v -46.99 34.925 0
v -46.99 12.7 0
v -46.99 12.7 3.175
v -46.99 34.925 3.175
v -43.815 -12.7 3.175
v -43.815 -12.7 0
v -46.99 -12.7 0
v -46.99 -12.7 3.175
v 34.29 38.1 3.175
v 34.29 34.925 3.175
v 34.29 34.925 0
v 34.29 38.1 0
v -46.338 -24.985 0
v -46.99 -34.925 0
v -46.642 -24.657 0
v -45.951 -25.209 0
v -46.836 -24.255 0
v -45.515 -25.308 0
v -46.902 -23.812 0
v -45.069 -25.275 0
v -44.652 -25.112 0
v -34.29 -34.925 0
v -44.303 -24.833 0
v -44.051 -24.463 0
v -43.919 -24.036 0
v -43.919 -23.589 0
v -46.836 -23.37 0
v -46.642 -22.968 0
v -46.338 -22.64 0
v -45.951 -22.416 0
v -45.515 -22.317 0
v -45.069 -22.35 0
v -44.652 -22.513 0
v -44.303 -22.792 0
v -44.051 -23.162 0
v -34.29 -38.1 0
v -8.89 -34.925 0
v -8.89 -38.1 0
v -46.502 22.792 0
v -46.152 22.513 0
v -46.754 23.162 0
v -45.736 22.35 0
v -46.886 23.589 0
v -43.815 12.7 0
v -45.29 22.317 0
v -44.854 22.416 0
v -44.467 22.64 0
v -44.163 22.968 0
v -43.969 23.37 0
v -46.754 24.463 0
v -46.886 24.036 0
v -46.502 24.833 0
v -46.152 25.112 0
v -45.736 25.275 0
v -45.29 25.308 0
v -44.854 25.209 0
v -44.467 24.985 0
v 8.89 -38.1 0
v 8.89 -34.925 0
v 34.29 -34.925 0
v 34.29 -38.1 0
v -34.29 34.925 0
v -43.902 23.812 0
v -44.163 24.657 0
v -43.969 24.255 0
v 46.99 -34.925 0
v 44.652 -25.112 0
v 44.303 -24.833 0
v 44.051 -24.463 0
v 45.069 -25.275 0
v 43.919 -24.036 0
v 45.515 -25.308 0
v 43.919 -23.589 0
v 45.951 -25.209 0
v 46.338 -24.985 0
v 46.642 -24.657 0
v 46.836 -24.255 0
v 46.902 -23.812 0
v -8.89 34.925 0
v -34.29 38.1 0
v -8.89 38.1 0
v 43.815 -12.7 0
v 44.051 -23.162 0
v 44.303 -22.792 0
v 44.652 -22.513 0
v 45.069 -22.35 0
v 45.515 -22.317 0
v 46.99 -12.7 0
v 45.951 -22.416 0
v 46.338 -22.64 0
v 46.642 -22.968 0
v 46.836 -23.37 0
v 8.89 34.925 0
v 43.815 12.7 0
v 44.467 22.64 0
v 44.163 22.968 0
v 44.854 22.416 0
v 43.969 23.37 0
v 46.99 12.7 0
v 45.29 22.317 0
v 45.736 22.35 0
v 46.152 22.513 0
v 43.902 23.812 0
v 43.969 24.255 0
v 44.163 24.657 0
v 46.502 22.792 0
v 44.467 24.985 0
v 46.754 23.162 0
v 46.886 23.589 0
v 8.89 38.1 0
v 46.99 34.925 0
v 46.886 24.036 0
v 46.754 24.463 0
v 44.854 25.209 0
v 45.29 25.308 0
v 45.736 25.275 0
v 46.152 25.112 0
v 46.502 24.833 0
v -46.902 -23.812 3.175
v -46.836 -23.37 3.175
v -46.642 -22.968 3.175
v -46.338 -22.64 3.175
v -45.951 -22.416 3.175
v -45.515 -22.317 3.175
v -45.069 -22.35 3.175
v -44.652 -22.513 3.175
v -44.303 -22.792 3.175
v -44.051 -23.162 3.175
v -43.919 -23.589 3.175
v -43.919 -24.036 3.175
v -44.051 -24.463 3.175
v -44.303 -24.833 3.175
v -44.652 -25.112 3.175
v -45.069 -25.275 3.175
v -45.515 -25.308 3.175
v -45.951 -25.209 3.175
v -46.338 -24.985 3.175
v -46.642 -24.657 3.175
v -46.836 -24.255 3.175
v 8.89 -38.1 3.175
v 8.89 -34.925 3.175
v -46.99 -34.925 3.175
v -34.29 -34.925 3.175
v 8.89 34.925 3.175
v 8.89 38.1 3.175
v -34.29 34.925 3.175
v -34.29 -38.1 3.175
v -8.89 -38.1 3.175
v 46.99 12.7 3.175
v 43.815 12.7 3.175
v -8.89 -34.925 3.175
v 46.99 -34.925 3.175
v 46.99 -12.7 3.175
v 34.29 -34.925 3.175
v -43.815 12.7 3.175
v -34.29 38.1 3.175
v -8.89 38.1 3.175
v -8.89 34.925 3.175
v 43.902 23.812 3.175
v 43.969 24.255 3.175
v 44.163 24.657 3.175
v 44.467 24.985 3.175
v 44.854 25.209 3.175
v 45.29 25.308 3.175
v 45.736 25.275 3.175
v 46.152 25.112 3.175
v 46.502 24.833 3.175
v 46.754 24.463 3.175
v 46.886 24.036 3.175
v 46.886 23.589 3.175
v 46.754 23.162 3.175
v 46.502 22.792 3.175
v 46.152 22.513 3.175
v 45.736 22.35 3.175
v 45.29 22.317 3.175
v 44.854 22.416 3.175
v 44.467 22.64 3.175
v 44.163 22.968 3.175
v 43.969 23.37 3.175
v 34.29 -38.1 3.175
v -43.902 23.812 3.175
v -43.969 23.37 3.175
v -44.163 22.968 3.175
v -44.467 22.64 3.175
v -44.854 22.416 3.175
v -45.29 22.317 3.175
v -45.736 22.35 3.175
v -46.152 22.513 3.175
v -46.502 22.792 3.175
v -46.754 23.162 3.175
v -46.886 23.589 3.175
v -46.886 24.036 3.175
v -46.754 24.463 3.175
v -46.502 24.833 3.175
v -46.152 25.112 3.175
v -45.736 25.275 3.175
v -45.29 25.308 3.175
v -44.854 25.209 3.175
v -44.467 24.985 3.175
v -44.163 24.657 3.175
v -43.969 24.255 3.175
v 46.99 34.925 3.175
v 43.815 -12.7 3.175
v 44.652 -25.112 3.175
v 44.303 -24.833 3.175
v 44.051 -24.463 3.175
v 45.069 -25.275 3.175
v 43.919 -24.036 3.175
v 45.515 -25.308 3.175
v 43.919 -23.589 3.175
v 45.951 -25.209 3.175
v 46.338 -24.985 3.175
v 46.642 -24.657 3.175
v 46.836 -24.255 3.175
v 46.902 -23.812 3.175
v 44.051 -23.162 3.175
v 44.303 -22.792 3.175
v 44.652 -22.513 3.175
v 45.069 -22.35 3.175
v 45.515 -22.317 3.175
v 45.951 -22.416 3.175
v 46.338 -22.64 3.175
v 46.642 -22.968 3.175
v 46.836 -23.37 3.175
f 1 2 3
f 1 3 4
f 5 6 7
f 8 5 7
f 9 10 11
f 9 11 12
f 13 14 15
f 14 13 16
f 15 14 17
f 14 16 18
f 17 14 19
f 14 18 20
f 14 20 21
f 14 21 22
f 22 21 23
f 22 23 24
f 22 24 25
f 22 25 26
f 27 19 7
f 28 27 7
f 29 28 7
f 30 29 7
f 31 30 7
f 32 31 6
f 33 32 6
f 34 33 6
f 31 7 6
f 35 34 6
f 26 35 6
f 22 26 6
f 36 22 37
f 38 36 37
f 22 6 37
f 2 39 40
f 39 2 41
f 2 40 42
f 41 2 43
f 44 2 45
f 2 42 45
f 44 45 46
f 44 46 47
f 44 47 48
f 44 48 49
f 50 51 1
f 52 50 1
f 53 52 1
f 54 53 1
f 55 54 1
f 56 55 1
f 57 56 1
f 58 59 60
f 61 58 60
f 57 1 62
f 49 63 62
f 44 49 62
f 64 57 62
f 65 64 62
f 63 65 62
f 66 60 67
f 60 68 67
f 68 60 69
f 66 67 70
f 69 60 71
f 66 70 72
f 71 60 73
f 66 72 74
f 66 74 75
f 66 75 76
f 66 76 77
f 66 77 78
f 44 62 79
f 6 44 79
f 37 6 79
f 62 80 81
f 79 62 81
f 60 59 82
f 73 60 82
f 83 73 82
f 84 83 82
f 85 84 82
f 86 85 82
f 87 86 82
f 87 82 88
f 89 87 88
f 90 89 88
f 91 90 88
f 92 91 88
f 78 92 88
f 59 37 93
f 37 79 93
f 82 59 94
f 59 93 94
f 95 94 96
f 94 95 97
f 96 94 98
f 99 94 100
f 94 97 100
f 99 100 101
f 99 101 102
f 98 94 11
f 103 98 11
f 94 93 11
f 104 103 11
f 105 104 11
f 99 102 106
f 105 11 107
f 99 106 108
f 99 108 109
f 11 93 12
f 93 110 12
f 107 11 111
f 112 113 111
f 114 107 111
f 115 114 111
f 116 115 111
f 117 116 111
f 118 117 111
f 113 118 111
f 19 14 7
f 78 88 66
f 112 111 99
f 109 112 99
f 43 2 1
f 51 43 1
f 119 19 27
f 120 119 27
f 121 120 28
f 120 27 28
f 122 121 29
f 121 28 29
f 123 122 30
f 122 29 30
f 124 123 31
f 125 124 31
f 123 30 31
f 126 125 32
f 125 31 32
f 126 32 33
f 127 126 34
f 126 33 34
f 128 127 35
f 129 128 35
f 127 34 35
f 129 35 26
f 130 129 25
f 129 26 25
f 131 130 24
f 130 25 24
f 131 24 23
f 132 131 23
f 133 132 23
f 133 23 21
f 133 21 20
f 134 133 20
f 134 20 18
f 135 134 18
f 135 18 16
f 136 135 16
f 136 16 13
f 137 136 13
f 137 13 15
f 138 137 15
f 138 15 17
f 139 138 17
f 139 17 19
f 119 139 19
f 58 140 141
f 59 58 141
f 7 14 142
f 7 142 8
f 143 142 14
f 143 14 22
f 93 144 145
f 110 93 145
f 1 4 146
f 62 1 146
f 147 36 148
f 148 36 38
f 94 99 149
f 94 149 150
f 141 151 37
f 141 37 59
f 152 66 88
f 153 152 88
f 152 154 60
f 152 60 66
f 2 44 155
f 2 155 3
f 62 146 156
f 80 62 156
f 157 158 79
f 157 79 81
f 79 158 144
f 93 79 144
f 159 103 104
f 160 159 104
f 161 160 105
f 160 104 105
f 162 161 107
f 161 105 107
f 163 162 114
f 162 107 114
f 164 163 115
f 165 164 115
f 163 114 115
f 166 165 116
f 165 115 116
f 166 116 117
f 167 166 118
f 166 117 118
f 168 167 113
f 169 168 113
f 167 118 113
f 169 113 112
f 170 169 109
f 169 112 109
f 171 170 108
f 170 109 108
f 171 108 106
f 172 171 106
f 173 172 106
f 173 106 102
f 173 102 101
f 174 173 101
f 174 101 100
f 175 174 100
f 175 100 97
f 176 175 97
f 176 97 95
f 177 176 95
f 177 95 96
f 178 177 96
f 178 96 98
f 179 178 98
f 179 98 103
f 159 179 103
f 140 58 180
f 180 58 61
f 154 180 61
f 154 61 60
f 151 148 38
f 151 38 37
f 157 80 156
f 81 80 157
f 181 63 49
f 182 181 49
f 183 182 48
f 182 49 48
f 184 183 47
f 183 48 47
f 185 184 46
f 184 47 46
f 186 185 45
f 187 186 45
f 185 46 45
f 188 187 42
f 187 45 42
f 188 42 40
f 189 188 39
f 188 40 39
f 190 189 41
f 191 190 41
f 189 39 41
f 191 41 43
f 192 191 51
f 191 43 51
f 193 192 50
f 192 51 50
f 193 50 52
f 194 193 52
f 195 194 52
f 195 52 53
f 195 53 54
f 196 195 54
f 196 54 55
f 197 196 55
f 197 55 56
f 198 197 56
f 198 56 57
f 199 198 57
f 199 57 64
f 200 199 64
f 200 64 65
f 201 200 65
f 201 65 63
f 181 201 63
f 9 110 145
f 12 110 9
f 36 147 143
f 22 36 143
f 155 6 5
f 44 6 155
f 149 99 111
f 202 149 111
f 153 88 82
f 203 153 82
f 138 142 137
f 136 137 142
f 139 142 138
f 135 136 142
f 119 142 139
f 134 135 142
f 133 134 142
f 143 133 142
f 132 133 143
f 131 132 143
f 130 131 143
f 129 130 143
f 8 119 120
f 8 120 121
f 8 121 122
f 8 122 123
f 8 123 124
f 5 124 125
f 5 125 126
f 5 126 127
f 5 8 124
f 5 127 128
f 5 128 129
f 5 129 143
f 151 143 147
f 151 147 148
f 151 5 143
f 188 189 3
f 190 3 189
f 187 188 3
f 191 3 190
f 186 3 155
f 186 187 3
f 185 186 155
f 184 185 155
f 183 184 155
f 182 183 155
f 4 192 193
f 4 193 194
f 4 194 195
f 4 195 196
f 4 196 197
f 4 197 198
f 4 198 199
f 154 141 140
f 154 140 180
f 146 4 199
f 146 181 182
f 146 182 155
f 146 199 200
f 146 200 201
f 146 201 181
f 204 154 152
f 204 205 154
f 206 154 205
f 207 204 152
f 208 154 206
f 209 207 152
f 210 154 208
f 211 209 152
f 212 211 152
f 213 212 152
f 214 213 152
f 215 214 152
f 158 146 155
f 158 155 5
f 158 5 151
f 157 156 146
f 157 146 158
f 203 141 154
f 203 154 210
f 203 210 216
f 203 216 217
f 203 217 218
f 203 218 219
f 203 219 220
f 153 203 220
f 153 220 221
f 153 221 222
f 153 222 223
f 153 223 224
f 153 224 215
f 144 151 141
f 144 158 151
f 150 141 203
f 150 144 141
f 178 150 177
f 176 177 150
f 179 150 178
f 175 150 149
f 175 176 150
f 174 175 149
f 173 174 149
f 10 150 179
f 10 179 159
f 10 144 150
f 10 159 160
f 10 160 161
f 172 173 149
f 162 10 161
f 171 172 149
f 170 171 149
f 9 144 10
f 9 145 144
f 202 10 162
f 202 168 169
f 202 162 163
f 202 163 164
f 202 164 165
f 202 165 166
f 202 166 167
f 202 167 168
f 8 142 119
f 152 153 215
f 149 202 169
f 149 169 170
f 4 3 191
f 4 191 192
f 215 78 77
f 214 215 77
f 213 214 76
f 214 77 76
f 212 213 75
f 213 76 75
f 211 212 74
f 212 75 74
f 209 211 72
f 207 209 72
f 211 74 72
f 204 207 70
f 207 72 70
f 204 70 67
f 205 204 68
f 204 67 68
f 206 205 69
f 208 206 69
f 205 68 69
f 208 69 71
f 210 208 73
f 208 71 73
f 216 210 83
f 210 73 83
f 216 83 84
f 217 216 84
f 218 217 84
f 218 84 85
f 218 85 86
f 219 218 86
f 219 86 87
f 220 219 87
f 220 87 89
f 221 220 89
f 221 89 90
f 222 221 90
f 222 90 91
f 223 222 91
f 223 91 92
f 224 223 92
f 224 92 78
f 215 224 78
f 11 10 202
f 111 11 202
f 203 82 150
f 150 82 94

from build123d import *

# Parameters (mm, degrees)
SKETCH1_W           = 93.98
SKETCH1_H           = 76.2
BOSS_EXTRUDE1_DEPTH = 3.175
SKETCH2_W           = 12.7
SKETCH2_H           = 3.175
SKETCH2_W_2         = 17.78
CUT_EXTRUDE1_DEPTH  = 61.578467503
SKETCH3_W           = 3.175
SKETCH3_H           = 25.4
CUT_EXTRUDE2_DEPTH  = 61.578467503
SKETCH4_R           = 1.5
CUT_EXTRUDE3_DEPTH  = 61.578467503


with BuildPart() as part:
    # Sketch1 → Boss-Extrude1 (new body)
    with BuildSketch(Plane.XY):
        Rectangle(SKETCH1_W, SKETCH1_H)
    extrude(amount=BOSS_EXTRUDE1_DEPTH)

    # Sketch2 → Cut-Extrude1 (cut, through all)
    with BuildSketch(Plane.XY.offset(3.175)):
        with Locations((40.64, 36.5125)):
            Rectangle(SKETCH2_W, SKETCH2_H)
        with Locations((-40.64, -36.5125)):
            Rectangle(SKETCH2_W, SKETCH2_H)
        with Locations((0, -36.5125)):
            Rectangle(SKETCH2_W_2, SKETCH2_H)
        with Locations((40.64, -36.5125)):
            Rectangle(SKETCH2_W, SKETCH2_H)
        with Locations((0, 36.5125)):
            Rectangle(SKETCH2_W_2, SKETCH2_H)
        with Locations((-40.64, 36.5125)):
            Rectangle(SKETCH2_W, SKETCH2_H)
    extrude(amount=-CUT_EXTRUDE1_DEPTH, mode=Mode.SUBTRACT)

    # Sketch3 → Cut-Extrude2 (cut, through all)
    with BuildSketch(Plane(origin=(0, 0, 0), x_dir=(-1, 0, 0), z_dir=(0, 0, -1))):
        with Locations((-45.4025, 0)):
            Rectangle(SKETCH3_W, SKETCH3_H)
        with Locations((45.4025, 0)):
            Rectangle(SKETCH3_W, SKETCH3_H)
    extrude(amount=-CUT_EXTRUDE2_DEPTH, mode=Mode.SUBTRACT)

    # Sketch4 → Cut-Extrude3 (cut, through all)
    with BuildSketch(Plane(origin=(0, 0, 0), x_dir=(-1, 0, 0), z_dir=(0, 0, -1))):
        with Locations((-45.4025, 23.8125)):
            Circle(SKETCH4_R)
        with Locations(Location((-45.4025, -23.8125, 0), (0, 0, 180))):
            Circle(SKETCH4_R)
        with Locations((45.4025, -23.8125)):
            Circle(SKETCH4_R)
        with Locations(Location((45.4025, 23.8125, 0), (0, 0, 180))):
            Circle(SKETCH4_R)
    extrude(amount=-CUT_EXTRUDE3_DEPTH, mode=Mode.SUBTRACT)


solid = part.part
